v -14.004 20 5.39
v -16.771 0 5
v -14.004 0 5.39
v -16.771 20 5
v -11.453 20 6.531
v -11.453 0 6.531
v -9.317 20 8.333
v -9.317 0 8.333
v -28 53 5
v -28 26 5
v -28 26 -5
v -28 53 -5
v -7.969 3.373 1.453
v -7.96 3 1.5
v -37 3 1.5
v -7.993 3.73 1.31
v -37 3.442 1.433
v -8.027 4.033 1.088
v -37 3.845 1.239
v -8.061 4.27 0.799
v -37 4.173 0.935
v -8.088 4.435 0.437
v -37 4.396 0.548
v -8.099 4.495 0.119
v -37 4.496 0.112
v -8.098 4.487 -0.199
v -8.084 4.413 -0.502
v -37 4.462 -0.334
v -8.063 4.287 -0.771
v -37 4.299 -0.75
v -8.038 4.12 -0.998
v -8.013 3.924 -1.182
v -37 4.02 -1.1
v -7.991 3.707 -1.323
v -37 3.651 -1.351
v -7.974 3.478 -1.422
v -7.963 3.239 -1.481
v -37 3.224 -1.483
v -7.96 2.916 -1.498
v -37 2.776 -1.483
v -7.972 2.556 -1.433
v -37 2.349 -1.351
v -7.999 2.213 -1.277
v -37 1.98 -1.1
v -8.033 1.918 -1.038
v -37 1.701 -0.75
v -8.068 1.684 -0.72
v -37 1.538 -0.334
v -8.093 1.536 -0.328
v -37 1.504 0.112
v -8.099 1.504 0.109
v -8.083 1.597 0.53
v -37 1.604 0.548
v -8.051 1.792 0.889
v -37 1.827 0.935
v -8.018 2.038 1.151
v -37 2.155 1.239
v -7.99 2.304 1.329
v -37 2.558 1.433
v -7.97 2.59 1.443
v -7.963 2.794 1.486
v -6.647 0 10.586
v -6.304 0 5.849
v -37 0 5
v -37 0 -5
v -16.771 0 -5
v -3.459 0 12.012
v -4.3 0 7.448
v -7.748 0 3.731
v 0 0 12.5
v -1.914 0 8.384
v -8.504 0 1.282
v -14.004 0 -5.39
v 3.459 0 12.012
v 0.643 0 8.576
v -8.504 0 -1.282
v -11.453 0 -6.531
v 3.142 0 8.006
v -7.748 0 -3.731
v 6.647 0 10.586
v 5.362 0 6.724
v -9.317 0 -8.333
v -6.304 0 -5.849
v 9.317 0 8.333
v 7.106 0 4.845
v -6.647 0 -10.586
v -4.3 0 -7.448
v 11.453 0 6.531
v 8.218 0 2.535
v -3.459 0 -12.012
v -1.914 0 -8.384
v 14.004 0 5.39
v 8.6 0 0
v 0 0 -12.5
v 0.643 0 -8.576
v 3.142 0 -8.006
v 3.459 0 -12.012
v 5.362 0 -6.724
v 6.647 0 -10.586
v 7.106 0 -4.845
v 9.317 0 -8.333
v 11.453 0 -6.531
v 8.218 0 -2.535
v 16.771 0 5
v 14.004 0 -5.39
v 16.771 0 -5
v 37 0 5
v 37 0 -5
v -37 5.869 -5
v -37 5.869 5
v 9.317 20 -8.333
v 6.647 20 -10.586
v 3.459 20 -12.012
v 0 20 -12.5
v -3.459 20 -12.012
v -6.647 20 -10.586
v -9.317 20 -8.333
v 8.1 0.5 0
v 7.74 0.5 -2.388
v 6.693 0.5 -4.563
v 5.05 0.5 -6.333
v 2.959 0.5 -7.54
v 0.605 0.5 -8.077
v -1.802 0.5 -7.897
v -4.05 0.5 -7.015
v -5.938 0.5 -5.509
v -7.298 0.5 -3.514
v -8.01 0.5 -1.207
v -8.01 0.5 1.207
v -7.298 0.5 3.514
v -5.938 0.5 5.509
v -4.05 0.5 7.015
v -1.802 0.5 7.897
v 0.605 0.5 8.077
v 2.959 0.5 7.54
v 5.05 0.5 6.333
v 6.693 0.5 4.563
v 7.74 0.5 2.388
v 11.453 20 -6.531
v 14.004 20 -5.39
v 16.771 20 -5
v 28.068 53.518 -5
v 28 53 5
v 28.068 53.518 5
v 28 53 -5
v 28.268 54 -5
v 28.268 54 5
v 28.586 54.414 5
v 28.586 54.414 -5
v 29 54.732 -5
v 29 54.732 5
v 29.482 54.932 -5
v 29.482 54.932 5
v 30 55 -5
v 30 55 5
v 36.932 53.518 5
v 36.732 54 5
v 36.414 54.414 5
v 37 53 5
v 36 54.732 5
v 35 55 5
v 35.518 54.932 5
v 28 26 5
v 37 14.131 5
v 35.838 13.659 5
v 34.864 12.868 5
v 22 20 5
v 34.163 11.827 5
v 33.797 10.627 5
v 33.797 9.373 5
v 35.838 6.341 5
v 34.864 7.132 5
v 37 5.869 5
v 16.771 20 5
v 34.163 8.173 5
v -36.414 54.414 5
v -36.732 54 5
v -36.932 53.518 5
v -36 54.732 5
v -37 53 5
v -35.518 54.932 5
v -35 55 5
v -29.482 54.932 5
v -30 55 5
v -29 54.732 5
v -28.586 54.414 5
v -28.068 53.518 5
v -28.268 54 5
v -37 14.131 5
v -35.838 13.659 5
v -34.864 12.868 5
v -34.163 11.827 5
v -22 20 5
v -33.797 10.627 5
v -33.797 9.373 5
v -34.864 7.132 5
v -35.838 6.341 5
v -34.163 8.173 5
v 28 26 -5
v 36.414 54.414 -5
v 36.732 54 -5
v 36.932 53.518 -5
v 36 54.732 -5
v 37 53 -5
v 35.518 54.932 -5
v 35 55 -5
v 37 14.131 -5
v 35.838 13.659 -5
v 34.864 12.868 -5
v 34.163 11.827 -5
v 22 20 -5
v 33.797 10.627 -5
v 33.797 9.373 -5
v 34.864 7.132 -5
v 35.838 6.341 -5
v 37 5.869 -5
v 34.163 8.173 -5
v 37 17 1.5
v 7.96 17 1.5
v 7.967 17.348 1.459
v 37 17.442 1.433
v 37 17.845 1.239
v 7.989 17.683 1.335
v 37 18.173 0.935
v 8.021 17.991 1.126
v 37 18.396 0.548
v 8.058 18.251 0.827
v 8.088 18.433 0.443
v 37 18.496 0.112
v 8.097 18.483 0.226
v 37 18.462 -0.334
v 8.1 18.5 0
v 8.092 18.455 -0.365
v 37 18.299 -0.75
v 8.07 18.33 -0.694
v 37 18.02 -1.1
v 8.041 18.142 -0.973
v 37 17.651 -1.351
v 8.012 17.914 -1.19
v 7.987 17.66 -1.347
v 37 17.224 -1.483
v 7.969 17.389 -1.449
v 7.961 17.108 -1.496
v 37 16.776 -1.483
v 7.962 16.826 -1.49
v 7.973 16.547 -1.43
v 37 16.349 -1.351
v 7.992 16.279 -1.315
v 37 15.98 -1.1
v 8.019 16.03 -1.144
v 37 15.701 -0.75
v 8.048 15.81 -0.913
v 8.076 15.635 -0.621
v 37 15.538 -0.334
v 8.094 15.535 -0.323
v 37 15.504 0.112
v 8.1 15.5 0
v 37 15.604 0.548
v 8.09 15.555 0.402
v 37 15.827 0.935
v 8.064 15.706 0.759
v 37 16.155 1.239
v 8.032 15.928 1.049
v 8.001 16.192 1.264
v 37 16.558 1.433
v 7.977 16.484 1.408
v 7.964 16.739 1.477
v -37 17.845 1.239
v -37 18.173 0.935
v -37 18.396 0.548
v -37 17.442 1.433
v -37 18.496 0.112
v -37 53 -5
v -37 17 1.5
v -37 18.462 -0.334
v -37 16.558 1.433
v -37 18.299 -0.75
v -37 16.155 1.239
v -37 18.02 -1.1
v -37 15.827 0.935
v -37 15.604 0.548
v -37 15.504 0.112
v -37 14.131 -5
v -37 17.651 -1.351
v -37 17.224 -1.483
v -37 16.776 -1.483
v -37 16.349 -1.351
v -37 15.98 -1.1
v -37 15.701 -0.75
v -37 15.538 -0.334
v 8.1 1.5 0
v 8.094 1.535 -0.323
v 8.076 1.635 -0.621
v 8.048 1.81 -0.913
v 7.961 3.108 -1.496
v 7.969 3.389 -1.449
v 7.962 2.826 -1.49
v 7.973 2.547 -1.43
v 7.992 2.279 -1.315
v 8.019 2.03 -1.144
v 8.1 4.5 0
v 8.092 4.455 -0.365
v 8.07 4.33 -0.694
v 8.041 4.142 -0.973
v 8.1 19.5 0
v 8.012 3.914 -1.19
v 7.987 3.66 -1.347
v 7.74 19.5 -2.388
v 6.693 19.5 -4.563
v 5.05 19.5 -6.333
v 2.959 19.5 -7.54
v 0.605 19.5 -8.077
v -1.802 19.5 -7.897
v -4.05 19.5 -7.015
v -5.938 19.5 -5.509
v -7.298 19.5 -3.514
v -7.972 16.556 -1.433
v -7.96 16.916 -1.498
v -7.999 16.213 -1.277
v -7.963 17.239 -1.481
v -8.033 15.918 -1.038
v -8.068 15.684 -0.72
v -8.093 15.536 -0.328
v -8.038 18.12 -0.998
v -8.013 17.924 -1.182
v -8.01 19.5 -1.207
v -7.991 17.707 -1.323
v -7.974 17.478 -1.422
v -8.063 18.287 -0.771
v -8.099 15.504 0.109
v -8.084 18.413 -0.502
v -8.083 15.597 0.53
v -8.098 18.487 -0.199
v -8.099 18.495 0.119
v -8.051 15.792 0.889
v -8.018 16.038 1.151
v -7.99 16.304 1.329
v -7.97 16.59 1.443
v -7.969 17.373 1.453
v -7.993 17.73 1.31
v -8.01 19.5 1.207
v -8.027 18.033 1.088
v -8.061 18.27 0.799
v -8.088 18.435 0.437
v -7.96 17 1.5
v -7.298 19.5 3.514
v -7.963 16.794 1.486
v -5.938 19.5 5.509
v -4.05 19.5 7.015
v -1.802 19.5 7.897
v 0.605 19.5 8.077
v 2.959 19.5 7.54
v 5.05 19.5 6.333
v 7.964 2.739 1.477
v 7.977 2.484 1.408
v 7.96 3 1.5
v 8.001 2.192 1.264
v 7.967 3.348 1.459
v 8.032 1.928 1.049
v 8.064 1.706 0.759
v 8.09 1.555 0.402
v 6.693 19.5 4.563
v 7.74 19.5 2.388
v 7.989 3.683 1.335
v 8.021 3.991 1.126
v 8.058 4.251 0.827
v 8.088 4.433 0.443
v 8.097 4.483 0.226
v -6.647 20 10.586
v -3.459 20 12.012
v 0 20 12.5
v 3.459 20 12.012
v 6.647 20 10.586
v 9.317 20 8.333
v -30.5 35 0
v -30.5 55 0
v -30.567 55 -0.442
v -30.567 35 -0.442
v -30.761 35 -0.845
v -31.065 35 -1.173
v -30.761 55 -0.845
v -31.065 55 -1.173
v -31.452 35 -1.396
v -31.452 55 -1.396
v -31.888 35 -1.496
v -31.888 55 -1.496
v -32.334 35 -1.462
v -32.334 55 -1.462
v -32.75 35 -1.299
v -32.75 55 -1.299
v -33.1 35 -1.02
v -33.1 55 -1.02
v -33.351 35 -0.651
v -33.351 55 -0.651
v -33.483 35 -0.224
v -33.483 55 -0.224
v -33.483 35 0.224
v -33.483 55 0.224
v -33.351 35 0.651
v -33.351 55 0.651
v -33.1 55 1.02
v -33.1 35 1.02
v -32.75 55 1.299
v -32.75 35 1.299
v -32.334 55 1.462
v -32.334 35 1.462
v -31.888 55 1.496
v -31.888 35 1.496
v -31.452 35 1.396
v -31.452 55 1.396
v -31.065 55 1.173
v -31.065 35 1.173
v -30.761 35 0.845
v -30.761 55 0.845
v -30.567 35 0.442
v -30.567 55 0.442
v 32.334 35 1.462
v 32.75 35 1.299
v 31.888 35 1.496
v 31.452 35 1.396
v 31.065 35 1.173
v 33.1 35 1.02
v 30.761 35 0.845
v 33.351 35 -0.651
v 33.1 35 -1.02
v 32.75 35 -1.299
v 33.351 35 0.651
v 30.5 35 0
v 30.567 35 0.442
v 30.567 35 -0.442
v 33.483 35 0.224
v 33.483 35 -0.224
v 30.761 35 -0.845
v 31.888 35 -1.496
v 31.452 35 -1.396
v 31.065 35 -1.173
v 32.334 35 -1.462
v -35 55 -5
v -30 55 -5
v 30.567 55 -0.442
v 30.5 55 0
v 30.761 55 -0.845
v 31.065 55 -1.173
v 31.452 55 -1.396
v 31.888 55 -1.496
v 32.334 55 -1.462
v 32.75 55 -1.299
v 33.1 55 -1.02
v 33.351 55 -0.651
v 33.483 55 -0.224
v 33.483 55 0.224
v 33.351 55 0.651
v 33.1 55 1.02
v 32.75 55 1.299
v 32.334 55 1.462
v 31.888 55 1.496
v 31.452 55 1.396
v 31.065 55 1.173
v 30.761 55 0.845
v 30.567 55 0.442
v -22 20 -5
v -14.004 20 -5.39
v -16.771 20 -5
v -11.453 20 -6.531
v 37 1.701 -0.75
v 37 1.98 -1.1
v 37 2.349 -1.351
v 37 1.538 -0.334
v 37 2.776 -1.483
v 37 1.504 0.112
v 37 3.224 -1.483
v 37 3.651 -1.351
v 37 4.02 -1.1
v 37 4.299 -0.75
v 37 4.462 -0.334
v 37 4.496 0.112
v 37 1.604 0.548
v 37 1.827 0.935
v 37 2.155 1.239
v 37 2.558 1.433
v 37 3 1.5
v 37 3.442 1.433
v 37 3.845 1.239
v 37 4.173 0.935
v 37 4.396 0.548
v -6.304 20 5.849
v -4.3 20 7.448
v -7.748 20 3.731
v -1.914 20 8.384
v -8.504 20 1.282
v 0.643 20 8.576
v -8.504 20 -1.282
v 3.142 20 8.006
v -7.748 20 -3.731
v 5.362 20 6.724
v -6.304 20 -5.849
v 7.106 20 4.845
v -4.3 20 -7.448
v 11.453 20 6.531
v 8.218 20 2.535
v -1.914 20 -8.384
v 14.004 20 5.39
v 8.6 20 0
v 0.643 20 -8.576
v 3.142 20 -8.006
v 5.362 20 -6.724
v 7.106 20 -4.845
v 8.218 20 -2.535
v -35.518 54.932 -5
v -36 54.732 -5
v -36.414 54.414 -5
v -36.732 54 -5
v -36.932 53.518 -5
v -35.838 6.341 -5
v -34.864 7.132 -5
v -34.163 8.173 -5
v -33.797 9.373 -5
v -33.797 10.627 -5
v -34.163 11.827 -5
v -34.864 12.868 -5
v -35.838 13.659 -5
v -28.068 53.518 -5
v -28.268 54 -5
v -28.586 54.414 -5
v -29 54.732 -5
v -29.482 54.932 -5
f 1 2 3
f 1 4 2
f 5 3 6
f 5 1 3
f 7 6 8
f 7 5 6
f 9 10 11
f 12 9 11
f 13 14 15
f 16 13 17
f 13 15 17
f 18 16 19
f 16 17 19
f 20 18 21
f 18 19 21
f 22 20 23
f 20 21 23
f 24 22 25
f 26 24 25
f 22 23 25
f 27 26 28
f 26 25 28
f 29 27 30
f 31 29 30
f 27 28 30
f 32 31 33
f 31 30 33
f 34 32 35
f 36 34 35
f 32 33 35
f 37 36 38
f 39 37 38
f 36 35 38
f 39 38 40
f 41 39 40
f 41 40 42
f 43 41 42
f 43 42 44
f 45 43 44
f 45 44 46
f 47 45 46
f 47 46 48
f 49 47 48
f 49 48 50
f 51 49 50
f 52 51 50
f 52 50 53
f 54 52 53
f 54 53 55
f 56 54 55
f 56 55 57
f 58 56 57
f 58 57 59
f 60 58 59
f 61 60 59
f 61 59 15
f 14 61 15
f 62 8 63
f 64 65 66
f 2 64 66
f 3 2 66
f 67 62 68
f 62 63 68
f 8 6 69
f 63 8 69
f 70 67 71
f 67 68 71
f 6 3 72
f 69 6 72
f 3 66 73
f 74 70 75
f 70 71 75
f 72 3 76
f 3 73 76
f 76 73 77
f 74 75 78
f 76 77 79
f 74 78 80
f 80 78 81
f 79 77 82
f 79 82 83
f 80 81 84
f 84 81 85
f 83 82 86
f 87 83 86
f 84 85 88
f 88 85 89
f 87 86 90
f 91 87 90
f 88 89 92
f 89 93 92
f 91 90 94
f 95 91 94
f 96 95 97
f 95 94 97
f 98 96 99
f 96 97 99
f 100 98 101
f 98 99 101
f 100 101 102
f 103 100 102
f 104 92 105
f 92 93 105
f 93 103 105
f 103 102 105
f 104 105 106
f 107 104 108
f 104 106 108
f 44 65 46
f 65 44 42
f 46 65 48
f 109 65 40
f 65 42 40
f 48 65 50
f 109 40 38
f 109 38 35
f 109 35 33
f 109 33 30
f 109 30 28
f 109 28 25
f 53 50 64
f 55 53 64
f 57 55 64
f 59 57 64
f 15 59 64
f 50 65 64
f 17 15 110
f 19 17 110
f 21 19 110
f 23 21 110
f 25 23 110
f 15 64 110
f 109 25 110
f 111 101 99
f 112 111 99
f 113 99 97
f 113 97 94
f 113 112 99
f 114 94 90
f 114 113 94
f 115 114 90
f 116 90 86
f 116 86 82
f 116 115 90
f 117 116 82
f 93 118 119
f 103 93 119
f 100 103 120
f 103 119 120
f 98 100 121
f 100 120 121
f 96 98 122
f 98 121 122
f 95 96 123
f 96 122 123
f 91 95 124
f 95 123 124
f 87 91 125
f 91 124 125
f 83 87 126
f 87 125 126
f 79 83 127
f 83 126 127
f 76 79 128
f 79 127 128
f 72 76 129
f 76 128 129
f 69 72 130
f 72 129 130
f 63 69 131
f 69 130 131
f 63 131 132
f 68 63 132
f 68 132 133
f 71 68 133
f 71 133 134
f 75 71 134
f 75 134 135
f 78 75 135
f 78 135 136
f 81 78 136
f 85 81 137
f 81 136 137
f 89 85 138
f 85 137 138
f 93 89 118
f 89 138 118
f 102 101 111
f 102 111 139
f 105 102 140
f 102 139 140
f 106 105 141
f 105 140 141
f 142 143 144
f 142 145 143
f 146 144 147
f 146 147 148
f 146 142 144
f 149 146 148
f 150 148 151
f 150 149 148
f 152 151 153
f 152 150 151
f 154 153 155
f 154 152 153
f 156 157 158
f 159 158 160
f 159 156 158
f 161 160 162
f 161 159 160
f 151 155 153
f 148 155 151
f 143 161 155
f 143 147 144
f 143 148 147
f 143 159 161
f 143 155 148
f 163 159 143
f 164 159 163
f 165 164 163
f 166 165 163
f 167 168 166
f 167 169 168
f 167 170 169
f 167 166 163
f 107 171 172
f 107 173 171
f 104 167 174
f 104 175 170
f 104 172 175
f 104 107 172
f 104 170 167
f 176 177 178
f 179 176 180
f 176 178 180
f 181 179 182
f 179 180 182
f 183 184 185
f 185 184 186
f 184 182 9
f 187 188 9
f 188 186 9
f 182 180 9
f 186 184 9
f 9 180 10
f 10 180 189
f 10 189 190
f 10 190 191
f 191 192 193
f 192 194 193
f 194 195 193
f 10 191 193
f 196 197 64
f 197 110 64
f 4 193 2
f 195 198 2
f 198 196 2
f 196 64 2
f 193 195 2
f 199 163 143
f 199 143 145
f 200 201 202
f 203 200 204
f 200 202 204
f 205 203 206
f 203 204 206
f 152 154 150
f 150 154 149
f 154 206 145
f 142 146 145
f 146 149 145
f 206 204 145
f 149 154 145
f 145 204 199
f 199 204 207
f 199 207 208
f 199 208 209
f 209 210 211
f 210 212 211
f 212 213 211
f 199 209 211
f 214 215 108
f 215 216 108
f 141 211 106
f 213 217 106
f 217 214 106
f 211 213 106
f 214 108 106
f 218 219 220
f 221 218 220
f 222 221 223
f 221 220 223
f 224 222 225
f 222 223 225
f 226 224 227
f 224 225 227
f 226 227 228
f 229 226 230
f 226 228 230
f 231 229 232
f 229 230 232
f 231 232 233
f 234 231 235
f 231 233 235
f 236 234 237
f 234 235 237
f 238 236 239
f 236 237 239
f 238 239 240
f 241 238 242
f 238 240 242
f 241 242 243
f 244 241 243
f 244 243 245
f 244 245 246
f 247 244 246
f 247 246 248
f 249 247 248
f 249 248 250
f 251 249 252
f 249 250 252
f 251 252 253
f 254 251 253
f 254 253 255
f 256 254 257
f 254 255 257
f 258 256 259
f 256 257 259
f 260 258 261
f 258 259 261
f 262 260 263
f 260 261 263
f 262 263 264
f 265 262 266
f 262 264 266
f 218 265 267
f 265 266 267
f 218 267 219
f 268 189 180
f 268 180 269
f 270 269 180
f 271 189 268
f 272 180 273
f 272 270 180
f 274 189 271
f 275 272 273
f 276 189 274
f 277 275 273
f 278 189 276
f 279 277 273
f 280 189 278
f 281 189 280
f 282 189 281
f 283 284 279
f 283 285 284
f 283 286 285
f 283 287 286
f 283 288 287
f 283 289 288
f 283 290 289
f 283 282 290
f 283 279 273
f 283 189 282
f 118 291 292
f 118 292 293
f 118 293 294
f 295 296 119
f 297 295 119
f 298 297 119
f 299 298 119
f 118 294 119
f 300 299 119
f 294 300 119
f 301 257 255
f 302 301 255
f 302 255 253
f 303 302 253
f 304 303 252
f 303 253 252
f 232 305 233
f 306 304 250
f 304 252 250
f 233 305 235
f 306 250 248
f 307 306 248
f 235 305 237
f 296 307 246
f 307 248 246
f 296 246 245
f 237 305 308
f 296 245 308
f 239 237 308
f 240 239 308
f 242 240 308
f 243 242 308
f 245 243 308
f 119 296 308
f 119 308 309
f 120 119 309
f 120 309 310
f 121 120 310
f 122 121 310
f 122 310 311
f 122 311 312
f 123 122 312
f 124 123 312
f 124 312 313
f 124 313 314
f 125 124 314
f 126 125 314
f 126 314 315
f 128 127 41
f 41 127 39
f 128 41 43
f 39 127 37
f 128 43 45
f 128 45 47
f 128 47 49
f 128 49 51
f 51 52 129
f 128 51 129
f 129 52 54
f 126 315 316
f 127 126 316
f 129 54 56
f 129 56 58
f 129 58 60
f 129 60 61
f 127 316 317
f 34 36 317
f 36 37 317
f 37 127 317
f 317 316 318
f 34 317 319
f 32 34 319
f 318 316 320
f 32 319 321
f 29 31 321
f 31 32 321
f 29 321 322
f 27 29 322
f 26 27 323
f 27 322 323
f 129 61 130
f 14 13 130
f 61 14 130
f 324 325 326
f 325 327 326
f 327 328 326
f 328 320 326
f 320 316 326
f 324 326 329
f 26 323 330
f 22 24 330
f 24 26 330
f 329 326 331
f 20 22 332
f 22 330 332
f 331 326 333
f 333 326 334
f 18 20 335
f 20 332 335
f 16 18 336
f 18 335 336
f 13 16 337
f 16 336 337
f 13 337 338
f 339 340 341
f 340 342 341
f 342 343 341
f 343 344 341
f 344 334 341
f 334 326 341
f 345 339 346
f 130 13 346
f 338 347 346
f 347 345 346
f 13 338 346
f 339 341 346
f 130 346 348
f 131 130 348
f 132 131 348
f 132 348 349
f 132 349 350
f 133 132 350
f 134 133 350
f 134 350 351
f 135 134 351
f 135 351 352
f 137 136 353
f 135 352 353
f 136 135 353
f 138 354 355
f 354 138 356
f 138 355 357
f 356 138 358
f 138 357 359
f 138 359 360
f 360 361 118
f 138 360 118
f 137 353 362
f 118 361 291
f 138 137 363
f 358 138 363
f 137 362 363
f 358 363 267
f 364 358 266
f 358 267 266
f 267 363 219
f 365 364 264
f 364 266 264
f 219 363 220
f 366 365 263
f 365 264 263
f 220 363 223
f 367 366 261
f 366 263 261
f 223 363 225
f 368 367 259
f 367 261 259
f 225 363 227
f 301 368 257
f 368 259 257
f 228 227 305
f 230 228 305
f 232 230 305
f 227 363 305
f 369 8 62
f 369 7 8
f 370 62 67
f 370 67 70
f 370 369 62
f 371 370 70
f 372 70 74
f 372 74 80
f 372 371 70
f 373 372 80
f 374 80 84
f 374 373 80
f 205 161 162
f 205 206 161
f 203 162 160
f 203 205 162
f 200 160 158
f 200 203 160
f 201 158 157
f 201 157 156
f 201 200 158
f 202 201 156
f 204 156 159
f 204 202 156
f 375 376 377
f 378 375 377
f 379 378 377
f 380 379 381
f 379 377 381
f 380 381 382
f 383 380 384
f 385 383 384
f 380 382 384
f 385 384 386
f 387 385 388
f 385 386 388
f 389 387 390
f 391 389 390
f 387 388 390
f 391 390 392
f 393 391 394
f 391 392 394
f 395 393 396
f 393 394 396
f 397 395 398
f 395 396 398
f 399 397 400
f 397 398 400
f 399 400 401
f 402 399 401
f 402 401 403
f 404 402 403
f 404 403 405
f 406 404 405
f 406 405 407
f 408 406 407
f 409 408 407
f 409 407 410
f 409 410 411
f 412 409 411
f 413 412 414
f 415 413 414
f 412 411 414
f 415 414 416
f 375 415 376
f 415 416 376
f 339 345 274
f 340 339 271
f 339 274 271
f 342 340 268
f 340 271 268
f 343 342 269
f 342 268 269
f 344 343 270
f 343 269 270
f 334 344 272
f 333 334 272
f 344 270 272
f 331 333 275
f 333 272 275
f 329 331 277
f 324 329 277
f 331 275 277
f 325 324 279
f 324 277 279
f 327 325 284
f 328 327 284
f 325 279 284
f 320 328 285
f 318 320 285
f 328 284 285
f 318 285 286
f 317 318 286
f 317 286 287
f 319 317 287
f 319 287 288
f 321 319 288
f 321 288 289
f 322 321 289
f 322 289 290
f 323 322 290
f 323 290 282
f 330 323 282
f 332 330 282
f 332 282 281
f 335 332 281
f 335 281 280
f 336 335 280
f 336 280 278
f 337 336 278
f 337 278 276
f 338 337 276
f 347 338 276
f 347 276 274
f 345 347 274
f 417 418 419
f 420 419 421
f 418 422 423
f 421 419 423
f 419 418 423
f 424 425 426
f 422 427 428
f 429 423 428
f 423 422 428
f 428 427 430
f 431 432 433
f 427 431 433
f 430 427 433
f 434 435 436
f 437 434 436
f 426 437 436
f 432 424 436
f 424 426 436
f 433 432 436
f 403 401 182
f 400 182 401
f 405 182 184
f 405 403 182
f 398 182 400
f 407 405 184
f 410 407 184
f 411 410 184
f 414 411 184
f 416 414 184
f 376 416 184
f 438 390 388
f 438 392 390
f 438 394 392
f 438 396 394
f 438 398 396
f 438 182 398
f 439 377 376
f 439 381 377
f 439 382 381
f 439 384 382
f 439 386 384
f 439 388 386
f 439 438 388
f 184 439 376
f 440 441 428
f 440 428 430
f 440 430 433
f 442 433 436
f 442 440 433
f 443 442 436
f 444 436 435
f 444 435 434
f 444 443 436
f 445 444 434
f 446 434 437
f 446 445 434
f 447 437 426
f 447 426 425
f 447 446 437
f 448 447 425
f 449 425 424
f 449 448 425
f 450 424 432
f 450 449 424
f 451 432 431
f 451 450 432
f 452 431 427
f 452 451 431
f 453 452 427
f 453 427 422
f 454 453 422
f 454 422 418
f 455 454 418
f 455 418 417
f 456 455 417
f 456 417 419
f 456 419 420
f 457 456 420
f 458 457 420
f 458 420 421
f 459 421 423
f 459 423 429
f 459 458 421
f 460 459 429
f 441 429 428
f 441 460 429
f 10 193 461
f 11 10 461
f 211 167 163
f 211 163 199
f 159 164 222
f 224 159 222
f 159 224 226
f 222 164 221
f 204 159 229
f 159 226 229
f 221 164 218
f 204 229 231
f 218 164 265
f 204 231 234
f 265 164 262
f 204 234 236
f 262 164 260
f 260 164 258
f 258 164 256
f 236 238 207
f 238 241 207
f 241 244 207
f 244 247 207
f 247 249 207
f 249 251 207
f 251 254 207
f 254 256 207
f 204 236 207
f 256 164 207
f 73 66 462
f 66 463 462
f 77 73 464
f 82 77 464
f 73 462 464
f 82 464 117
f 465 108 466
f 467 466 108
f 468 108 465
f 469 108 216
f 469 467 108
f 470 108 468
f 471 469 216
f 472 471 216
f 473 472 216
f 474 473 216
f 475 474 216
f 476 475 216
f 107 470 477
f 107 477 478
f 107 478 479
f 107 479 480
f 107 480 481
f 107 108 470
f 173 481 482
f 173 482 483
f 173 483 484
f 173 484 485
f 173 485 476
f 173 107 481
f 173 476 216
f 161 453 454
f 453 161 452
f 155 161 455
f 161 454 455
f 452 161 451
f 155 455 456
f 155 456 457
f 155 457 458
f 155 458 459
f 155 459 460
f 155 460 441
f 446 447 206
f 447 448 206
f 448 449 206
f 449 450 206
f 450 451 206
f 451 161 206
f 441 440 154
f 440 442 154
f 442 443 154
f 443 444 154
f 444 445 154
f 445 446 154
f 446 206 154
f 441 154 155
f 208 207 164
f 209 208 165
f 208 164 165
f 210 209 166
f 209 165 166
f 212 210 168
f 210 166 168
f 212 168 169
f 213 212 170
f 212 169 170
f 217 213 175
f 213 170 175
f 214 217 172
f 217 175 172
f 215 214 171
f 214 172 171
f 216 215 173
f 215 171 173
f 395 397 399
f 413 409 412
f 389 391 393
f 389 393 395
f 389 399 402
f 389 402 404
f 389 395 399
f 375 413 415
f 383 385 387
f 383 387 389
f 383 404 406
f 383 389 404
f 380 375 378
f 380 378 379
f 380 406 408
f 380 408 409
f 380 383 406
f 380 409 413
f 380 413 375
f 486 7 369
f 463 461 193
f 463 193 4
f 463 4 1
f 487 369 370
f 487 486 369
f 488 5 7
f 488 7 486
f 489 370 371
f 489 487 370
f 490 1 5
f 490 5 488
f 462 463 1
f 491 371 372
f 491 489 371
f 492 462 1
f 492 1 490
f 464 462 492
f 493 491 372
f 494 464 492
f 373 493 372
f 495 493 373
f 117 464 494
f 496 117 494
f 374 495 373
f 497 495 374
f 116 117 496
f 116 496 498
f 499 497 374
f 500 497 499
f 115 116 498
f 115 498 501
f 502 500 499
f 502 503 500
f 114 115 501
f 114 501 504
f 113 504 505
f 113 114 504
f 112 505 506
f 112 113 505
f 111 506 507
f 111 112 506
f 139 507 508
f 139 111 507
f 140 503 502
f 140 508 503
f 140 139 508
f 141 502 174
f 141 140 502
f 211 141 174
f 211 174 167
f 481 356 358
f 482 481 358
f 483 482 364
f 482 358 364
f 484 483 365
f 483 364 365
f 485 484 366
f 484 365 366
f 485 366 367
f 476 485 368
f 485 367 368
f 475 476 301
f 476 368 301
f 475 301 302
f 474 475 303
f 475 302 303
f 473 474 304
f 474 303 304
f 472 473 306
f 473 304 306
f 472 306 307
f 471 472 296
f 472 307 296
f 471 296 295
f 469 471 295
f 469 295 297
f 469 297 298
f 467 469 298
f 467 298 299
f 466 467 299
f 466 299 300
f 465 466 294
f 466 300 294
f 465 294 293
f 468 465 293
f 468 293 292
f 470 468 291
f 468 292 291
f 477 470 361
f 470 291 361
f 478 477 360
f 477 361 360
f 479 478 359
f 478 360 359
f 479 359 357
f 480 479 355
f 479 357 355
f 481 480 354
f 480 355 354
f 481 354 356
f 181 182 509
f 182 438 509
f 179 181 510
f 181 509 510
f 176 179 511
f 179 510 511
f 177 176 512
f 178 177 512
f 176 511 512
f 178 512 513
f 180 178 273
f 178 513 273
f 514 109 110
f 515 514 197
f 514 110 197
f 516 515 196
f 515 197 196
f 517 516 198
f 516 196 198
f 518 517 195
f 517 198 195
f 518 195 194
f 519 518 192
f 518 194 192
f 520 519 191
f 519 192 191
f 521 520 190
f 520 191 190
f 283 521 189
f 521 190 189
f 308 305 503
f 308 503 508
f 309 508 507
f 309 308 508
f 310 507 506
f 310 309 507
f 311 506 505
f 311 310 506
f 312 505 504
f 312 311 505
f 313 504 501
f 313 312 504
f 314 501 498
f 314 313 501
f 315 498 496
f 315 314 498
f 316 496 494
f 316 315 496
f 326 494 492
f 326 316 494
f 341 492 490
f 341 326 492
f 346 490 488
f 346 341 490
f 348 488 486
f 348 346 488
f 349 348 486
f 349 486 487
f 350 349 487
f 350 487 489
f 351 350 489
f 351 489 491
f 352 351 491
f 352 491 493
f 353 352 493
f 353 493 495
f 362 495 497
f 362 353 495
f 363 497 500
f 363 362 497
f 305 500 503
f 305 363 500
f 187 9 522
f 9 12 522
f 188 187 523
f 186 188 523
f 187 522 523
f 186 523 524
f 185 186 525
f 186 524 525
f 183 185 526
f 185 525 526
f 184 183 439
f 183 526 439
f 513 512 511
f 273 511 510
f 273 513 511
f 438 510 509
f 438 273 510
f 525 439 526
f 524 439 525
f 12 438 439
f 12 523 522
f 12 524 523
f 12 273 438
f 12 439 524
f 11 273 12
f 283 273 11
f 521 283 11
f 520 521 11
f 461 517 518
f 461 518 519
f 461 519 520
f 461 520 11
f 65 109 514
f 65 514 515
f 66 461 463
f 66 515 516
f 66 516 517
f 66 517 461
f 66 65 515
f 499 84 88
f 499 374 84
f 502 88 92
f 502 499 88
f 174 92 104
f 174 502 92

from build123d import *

# Parameters (mm, degrees)
SKETCH1_W                = 88
SKETCH1_H                = 10
BOSS_EXTRUDE1_DEPTH      = 20
SKETCH2_R                = 4.25
CUT_EXTRUDE1_DEPTH       = 11
SKETCH7_R                = 12.5
BOSS_EXTRUDE2_DEPTH      = 20
SKETCH4_R                = 8.1
CUT_EXTRUDE3_DEPTH       = 21
FILLET2_R                = 10
SKETCH9_W                = 7
SKETCH9_H                = 20
CUT_EXTRUDE6_DEPTH       = 18.5
SKETCH10_W               = 9
SKETCH10_H               = 10
BOSS_EXTRUDE3_DEPTH      = 35
SKETCH11_R               = 1.5
CUT_EXTRUDE7_DEPTH       = 20
CHAMFER1_SIZE            = 6
FILLET3_R                = 2
CHAMFER1_OF_MIRROR1_SIZE = 6
FILLET3_OF_MIRROR1_R     = 2
CHAMFER2_SIZE            = 0.5
SKETCH12_R               = 1.5
CUT_EXTRUDE8_DEPTH       = 75


with BuildPart() as part:
    # Sketch1 → Boss-Extrude1 (new body)
    with BuildSketch(Plane(origin=(0, 0, 0), x_dir=(1, 0, 0), z_dir=(0, 1, 0))):
        Rectangle(SKETCH1_W, SKETCH1_H)
    extrude(amount=BOSS_EXTRUDE1_DEPTH)

    # Sketch2 → Cut-Extrude1 (cut, through all)
    with BuildSketch(Plane.XY.offset(5)):
        with Locations((-38, 10)):
            Circle(SKETCH2_R)
        with Locations((38, 10)):
            Circle(SKETCH2_R)
    extrude(amount=-CUT_EXTRUDE1_DEPTH, mode=Mode.SUBTRACT)

    # Sketch7 → Boss-Extrude2 (add)
    with BuildSketch(Plane(origin=(0, 20, 0), x_dir=(1, 0, 0), z_dir=(0, 1, 0))):
        Circle(SKETCH7_R)
    extrude(amount=-BOSS_EXTRUDE2_DEPTH)

    # Sketch4 → Cut-Extrude3 (cut, through all)
    with BuildSketch(Plane(origin=(0, 20, 0), x_dir=(1, 0, 0), z_dir=(0, 1, 0))):
        Circle(SKETCH4_R)
    extrude(amount=-CUT_EXTRUDE3_DEPTH, mode=Mode.SUBTRACT)

    # Fillet2
    fillet2_edges = [part.edges().sort_by_distance(p)[0] for p in [
        (11.456439237, 10, -5),
        (11.456439237, 10, 5),
        (-11.456439237, 10, -5),
        (-11.456439237, 10, 5),
    ]]
    fillet(fillet2_edges, radius=FILLET2_R)

    # Sketch9 → Cut-Extrude6 (cut, through all)
    with BuildSketch(Plane.XY.offset(5)):
        with Locations((-40.5, 10)):
            Rectangle(SKETCH9_W, SKETCH9_H)
        with Locations((40.5, 10)):
            Rectangle(SKETCH9_W, SKETCH9_H)
    extrude(amount=-CUT_EXTRUDE6_DEPTH, mode=Mode.SUBTRACT)

    # Sketch10 → Boss-Extrude3 (add)
    with BuildSketch(Plane(origin=(0, 20, 0), x_dir=(1, 0, 0), z_dir=(0, 1, 0))):
        with Locations((-32.5, 0)):
            Rectangle(SKETCH10_W, SKETCH10_H)
    boss_extrude3 = extrude(amount=BOSS_EXTRUDE3_DEPTH)

    # Sketch11 → Cut-Extrude7 (cut)
    with BuildSketch(Plane(origin=(0, 55, 0), x_dir=(1, 0, 0), z_dir=(0, 1, 0))):
        with Locations((-32, 0)):
            Circle(SKETCH11_R)
    cut_extrude7 = extrude(amount=-CUT_EXTRUDE7_DEPTH, mode=Mode.SUBTRACT)

    # Chamfer1
    chamfer1_edges = [part.edges().sort_by_distance(p)[0] for p in [
        (-28, 20, 0),
    ]]
    chamfer(chamfer1_edges, length=CHAMFER1_SIZE)

    # Fillet3
    fillet3_edges = [part.edges().sort_by_distance(p)[0] for p in [
        (-37, 55, 0),
        (-28, 55, 0),
    ]]
    fillet(fillet3_edges, radius=FILLET3_R)

    # Mirror1: Boss-Extrude3, Cut-Extrude7 across plane
    add(boss_extrude3.mirror(Plane(origin=(0, 0, 0), x_dir=(0, 0, 1), z_dir=(1, 0, 0))))
    add(cut_extrude7.mirror(Plane(origin=(0, 0, 0), x_dir=(0, 0, 1), z_dir=(1, 0, 0))), mode=Mode.SUBTRACT)

    # Chamfer1 of Mirror1
    chamfer1_of_mirror1_edges = [part.edges().sort_by_distance(p)[0] for p in [
        (28, 20, 0),
    ]]
    chamfer(chamfer1_of_mirror1_edges, length=CHAMFER1_OF_MIRROR1_SIZE)

    # Fillet3 of Mirror1
    fillet3_of_mirror1_edges = [part.edges().sort_by_distance(p)[0] for p in [
        (37, 55, 0),
        (28, 55, 0),
    ]]
    fillet(fillet3_of_mirror1_edges, radius=FILLET3_OF_MIRROR1_R)

    # Chamfer2
    chamfer2_edges = [part.edges().sort_by_distance(p)[0] for p in [
        (-8.1, 0, 0),
        (-8.1, 20, 0),
    ]]
    chamfer(chamfer2_edges, length=CHAMFER2_SIZE)

    # Sketch12 → Cut-Extrude8 (cut, through all)
    with BuildSketch(Plane.ZY.offset(37)):
        with Locations((0, 3)):
            Circle(SKETCH12_R)
        with Locations((0, 17)):
            Circle(SKETCH12_R)
    extrude(amount=-CUT_EXTRUDE8_DEPTH, mode=Mode.SUBTRACT)


solid = part.part
